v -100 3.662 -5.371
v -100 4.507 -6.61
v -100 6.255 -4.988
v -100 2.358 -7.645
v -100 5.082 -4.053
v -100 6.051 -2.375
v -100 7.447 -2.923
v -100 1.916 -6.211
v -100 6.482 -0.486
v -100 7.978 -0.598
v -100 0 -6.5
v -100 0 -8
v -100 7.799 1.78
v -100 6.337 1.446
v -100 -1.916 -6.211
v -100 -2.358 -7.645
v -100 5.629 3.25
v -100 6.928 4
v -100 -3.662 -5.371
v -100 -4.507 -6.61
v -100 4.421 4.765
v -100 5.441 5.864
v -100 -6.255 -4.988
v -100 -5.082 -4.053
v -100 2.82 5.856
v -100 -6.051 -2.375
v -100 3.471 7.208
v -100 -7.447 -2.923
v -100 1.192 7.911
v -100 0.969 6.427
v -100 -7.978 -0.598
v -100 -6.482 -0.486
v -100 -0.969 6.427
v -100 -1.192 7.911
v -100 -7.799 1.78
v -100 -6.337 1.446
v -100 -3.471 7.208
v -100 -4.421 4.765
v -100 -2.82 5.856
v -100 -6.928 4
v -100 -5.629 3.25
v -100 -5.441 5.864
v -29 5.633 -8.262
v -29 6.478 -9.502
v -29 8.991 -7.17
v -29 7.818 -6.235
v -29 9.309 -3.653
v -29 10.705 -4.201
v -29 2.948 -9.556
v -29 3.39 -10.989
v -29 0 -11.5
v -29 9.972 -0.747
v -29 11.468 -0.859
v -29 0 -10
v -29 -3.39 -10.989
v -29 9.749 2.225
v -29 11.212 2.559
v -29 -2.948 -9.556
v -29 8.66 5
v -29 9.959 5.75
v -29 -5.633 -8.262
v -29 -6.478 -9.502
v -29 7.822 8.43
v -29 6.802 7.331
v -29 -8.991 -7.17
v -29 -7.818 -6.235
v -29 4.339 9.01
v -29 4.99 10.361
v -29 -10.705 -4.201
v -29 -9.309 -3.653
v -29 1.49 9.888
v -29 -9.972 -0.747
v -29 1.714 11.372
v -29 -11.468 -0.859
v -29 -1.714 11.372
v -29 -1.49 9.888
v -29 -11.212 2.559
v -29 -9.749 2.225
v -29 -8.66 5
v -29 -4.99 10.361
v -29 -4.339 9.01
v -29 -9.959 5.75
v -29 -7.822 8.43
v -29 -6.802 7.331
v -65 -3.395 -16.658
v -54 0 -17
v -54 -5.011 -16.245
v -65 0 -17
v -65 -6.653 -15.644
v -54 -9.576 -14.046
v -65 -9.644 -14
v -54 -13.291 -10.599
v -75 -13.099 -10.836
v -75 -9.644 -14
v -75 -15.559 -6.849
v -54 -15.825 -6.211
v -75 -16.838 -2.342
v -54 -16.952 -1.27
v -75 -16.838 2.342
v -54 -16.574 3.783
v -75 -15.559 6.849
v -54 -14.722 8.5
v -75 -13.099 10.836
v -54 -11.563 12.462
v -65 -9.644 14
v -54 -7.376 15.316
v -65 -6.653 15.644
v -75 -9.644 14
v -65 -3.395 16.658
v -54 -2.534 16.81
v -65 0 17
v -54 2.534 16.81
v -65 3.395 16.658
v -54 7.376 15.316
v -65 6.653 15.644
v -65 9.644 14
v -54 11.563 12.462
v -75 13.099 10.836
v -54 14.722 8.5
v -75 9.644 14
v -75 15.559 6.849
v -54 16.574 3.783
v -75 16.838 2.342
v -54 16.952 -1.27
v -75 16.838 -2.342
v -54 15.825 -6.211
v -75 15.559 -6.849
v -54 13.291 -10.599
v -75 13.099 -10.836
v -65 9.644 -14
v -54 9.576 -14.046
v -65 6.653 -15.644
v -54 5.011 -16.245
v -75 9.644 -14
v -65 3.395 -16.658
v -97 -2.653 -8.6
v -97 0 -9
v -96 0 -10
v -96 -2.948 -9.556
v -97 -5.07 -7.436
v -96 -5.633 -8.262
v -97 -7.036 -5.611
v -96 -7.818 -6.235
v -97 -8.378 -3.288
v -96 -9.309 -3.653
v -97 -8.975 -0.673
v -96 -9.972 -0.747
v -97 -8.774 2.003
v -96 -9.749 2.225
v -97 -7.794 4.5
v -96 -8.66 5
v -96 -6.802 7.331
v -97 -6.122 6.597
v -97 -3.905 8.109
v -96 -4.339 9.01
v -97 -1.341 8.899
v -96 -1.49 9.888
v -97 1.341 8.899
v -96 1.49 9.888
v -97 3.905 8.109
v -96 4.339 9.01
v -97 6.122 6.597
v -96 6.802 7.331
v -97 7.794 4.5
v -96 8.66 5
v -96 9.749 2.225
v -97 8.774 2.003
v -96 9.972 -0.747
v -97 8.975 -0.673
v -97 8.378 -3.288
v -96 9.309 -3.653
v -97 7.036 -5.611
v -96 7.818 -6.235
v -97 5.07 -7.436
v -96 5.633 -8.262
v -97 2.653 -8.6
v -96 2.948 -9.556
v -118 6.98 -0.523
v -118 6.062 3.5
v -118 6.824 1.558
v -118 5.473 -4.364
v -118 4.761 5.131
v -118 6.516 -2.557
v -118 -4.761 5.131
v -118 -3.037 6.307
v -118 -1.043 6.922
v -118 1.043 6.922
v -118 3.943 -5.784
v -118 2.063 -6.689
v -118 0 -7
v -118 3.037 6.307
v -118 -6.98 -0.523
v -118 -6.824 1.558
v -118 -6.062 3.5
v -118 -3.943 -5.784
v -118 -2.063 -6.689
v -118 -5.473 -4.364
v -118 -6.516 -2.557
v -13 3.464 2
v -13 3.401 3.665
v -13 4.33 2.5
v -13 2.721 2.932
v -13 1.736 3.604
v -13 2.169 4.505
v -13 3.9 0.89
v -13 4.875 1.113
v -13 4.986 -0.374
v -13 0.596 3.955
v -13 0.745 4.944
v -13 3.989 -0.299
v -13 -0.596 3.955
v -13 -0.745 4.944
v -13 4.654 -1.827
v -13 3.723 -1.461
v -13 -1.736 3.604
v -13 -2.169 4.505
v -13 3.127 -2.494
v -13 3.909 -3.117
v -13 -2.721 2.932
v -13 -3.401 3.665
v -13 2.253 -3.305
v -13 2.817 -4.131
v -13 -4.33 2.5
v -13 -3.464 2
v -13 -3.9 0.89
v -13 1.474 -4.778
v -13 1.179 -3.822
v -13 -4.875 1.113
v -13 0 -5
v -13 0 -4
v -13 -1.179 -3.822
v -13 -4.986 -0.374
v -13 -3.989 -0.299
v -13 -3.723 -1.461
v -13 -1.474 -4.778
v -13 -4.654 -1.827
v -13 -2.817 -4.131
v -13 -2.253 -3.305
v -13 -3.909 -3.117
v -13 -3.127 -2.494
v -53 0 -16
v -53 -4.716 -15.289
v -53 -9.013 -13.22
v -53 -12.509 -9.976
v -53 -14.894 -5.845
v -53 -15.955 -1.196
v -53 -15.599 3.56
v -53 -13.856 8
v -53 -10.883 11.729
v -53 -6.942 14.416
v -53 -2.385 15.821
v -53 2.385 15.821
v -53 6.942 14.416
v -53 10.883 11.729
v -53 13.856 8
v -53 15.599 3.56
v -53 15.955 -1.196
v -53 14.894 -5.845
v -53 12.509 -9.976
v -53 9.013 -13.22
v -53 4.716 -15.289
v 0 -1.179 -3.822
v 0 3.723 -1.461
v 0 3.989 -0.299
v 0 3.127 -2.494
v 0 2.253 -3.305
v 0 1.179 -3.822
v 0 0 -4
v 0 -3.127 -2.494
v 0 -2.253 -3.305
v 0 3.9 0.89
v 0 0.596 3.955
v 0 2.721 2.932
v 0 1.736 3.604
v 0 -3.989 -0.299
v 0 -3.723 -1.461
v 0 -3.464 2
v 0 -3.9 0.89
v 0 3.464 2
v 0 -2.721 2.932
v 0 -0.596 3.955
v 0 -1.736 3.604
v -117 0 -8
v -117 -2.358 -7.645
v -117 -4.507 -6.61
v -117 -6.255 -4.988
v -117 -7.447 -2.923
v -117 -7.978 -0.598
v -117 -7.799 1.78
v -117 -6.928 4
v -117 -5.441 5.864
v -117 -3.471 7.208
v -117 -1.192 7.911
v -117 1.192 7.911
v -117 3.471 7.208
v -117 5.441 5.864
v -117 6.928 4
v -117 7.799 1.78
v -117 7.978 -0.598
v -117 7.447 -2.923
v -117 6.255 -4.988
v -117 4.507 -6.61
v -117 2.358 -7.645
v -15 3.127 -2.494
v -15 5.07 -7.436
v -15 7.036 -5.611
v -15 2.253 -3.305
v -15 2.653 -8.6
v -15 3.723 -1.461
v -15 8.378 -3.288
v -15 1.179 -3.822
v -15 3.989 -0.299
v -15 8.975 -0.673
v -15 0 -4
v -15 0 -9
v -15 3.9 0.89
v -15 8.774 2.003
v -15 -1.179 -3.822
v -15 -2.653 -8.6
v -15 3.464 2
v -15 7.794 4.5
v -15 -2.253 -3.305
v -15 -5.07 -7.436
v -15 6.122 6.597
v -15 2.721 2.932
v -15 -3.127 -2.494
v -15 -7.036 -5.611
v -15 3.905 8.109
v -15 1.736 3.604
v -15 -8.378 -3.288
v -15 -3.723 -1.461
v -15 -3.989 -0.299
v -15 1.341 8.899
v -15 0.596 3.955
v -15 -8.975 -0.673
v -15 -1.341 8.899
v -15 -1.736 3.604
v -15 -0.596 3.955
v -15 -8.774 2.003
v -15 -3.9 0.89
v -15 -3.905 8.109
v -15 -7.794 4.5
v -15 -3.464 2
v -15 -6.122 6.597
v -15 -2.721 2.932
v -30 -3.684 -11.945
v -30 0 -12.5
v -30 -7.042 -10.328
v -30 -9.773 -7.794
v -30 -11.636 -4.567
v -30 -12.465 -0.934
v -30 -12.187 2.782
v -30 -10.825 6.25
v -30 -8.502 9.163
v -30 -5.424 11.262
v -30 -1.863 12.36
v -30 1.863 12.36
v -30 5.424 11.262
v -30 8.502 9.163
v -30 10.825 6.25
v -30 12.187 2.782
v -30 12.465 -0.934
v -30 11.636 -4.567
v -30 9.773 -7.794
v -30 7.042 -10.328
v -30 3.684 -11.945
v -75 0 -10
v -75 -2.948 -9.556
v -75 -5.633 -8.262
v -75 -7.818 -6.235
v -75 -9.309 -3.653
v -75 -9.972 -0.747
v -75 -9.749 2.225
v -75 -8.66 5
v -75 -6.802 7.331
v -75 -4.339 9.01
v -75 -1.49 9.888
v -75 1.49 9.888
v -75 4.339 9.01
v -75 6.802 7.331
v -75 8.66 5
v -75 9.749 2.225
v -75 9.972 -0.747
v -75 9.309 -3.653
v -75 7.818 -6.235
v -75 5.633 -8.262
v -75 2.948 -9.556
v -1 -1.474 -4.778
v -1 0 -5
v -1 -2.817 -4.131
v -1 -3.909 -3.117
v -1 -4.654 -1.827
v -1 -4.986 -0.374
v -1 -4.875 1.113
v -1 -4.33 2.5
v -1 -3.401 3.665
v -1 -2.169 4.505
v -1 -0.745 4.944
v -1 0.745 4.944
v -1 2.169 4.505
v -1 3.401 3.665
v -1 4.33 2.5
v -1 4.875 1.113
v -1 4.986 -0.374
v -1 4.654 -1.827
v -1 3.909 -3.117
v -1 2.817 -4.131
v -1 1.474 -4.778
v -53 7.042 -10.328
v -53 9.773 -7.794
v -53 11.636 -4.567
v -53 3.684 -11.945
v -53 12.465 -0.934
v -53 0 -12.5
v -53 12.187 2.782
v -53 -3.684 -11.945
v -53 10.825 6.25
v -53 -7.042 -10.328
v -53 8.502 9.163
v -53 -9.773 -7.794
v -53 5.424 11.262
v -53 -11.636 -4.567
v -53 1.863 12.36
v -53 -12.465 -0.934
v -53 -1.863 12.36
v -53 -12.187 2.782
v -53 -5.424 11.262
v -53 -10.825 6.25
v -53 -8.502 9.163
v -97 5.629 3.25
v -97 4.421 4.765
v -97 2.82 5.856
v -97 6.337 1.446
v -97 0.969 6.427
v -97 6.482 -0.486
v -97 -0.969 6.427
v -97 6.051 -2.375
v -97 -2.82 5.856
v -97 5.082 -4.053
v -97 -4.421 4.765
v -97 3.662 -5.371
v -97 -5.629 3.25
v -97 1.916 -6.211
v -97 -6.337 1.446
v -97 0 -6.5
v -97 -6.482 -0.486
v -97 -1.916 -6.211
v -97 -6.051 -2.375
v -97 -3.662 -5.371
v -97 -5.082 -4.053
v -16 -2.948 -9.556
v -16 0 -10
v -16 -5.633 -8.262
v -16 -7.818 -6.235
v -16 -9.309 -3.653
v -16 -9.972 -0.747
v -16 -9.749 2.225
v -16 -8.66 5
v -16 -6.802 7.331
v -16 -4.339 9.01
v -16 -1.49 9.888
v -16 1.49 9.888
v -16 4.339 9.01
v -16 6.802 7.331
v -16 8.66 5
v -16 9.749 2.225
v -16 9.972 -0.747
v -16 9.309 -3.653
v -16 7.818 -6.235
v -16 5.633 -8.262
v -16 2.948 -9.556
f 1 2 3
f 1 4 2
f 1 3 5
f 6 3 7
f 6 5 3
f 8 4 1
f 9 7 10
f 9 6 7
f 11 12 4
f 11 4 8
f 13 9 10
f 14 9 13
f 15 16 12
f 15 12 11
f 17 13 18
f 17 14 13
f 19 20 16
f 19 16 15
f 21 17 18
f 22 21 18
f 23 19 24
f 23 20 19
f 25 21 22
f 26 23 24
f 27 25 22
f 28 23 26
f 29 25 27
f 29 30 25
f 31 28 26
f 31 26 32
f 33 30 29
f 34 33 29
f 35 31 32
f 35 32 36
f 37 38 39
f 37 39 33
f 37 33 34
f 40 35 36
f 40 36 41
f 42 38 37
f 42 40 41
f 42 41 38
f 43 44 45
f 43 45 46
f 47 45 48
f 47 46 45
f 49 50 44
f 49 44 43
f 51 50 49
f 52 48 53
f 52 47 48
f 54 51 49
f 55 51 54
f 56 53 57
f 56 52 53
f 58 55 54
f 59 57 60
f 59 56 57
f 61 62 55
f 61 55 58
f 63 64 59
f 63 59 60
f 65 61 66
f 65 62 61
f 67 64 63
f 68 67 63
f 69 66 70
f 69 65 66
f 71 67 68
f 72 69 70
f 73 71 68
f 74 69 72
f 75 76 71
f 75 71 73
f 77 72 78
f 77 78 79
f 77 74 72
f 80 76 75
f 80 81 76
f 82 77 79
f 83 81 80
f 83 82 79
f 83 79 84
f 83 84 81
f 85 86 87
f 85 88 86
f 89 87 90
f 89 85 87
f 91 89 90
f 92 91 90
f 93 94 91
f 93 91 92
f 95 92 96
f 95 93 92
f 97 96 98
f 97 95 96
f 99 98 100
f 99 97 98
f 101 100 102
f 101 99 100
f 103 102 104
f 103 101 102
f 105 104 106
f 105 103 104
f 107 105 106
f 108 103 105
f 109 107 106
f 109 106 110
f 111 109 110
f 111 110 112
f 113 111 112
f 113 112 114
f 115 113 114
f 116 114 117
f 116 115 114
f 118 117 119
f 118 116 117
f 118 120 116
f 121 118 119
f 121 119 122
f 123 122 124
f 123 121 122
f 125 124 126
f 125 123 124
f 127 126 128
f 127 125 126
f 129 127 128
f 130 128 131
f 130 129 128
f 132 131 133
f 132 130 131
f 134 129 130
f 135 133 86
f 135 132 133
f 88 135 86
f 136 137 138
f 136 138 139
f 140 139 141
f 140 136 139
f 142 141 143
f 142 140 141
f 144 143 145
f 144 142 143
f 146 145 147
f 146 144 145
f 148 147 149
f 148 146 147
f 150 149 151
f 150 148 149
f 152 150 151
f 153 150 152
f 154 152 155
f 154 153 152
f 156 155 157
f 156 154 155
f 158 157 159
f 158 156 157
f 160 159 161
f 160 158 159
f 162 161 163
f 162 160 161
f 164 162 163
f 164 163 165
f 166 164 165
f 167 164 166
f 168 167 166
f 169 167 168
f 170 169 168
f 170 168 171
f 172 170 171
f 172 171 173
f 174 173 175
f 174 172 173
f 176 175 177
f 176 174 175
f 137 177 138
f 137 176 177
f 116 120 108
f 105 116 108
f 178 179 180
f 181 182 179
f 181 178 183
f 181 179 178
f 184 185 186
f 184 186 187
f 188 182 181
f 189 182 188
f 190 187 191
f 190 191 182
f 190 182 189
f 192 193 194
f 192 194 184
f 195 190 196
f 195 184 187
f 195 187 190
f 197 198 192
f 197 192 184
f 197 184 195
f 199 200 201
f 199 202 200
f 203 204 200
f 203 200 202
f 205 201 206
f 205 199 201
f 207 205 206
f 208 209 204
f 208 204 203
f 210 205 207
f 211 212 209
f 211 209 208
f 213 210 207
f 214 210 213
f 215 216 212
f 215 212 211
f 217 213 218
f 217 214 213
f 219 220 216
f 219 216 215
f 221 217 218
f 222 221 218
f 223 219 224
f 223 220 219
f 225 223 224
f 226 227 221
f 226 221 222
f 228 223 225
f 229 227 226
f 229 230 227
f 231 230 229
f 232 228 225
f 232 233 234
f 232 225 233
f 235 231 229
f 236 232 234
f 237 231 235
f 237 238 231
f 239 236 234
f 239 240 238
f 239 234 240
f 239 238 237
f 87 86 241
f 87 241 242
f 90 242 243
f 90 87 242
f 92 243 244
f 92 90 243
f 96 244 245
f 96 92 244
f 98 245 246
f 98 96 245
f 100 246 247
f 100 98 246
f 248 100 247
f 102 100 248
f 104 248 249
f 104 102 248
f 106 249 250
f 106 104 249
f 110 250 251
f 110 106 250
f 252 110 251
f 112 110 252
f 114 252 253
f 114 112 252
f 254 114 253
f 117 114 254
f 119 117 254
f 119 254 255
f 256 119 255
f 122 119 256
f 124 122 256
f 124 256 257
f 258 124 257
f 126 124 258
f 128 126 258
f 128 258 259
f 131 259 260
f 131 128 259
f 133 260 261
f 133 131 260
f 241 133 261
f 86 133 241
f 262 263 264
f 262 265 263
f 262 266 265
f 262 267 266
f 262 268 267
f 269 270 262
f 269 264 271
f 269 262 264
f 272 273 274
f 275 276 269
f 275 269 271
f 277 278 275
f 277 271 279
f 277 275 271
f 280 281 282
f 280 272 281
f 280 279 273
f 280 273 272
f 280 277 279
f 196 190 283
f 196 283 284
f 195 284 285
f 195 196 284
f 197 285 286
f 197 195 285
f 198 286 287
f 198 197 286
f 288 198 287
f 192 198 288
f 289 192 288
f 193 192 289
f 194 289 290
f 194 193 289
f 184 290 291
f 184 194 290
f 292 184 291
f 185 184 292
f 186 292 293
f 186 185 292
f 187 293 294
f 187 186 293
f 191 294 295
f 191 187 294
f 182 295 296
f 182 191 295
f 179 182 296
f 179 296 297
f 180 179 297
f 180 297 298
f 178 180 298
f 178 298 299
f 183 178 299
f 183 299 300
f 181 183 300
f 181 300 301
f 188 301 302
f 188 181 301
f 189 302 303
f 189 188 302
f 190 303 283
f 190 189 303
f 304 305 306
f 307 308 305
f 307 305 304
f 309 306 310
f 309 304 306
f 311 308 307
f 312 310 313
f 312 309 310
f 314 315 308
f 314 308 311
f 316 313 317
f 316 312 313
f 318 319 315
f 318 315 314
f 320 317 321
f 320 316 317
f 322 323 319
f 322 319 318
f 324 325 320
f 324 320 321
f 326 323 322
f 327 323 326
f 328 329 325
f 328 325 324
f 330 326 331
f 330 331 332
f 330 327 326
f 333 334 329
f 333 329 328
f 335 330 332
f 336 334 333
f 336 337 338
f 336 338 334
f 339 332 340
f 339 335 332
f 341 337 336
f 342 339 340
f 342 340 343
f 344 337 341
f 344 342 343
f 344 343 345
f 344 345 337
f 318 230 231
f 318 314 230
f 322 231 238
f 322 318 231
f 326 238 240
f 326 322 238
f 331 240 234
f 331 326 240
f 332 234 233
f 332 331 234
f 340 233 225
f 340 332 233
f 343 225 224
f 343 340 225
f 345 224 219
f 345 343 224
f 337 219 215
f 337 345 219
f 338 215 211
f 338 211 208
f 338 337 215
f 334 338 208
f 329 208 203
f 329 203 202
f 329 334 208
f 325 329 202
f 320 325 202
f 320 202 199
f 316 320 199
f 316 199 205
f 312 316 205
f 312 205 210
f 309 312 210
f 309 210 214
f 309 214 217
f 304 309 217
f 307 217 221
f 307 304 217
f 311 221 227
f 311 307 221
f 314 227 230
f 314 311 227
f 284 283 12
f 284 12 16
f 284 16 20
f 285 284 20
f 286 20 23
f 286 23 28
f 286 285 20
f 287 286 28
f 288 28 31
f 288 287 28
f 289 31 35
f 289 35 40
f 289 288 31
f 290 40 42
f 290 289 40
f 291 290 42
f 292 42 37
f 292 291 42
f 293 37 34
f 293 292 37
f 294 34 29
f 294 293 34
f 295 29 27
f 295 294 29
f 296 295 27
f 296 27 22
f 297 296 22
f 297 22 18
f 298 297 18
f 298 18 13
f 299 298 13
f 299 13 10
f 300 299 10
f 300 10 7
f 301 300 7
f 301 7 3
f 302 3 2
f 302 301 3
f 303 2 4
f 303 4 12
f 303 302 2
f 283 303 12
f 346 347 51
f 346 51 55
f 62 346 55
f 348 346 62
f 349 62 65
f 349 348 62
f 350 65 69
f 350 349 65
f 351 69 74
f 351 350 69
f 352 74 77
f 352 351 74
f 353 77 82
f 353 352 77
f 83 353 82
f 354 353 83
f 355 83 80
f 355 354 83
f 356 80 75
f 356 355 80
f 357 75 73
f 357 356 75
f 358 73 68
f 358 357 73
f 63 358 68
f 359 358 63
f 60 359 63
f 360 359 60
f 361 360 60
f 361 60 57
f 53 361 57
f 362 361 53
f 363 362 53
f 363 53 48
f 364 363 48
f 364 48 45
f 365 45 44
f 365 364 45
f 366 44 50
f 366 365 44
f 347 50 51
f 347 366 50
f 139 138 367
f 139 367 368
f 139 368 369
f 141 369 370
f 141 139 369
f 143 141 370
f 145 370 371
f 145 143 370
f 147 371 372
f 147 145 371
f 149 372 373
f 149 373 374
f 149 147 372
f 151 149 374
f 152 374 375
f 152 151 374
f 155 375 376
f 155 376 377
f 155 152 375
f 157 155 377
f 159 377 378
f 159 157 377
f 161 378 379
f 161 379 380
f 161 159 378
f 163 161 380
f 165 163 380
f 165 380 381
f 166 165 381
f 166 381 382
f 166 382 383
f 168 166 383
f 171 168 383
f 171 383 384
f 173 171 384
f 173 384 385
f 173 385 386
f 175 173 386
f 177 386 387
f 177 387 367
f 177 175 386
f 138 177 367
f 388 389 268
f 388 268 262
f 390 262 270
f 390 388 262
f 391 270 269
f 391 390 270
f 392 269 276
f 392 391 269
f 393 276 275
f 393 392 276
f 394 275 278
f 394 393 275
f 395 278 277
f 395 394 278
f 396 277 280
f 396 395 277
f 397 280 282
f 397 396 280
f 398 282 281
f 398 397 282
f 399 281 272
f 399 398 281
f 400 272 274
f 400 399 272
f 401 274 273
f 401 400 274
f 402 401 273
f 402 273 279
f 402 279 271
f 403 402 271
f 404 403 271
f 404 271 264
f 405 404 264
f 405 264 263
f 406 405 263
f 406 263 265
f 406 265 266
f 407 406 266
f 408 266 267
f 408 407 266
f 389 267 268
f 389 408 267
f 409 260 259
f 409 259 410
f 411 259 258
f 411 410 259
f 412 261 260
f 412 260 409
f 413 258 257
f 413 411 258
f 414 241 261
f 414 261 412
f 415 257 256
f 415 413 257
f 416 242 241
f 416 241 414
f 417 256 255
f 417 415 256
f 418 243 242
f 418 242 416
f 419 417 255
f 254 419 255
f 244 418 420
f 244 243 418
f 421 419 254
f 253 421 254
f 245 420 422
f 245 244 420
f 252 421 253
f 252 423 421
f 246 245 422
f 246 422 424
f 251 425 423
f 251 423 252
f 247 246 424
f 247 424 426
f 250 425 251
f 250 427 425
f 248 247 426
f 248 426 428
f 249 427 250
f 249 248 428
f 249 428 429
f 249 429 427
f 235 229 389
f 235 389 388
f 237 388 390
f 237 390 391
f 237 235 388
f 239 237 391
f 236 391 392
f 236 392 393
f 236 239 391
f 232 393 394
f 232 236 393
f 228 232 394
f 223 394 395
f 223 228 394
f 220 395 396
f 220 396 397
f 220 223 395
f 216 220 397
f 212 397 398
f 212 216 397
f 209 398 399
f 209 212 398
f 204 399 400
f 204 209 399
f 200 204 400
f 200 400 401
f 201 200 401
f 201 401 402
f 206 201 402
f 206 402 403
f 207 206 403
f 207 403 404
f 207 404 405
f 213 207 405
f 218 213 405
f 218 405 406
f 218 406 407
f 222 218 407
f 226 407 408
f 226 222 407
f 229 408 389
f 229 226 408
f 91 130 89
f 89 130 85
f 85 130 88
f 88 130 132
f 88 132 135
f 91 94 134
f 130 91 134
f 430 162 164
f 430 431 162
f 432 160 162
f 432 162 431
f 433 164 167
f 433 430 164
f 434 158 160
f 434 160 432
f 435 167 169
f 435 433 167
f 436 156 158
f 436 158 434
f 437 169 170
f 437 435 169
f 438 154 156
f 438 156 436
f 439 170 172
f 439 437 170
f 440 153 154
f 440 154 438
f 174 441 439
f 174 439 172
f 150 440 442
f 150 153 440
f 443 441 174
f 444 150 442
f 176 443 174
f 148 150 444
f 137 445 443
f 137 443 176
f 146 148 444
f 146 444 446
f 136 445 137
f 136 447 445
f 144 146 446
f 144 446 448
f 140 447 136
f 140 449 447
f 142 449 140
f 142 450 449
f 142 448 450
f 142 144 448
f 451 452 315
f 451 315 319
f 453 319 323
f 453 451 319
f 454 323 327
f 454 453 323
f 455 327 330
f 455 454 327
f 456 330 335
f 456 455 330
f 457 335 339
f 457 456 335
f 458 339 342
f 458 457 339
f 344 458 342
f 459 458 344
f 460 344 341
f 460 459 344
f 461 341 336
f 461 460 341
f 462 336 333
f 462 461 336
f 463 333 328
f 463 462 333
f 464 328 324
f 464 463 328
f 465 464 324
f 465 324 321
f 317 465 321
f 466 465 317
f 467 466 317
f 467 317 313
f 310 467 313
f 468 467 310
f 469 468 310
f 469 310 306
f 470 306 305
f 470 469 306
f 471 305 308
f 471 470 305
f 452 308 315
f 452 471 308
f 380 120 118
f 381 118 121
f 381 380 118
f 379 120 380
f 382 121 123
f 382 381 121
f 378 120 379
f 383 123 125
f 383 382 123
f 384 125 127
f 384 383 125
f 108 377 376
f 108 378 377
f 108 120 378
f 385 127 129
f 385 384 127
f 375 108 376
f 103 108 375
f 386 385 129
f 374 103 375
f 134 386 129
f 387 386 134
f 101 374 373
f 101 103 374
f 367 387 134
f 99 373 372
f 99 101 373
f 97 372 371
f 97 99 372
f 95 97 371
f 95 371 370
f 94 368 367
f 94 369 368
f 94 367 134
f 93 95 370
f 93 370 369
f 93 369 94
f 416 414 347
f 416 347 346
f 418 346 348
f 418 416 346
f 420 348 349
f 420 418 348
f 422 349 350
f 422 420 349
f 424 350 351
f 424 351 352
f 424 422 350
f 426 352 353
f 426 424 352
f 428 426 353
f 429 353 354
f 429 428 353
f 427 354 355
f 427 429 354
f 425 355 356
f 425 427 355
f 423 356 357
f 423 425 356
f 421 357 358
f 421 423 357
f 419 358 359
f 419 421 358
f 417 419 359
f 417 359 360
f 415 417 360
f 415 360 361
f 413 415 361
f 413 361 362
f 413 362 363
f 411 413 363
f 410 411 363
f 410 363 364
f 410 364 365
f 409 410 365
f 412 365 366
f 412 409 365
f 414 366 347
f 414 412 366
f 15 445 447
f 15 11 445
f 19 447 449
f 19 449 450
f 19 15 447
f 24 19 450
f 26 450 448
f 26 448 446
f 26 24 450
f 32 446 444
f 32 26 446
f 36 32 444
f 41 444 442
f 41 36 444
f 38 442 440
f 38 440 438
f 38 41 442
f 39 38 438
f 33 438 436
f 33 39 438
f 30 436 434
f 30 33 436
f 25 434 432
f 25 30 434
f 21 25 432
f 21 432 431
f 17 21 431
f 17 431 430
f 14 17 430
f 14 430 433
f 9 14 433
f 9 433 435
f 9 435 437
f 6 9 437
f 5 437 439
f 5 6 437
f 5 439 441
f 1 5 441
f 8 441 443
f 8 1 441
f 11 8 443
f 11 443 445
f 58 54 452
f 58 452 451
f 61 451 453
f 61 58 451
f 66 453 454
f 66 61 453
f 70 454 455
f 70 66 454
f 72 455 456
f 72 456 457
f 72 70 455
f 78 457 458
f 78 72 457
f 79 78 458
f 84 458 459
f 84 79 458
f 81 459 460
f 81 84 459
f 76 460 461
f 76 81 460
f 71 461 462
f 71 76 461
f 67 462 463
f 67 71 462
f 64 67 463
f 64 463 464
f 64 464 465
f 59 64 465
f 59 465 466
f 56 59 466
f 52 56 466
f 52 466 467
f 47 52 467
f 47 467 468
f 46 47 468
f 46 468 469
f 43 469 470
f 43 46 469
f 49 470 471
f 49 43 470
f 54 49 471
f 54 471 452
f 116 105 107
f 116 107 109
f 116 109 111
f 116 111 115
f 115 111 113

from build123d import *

# Parameters (mm, degrees)
CHAMFER1_SIZE      = 1
CUT_EXTRUDE1_DEPTH = 10


with BuildPart() as part:
    # Sketch1 → Revolve1 (revolve)
    with BuildSketch(Plane.XY, mode=Mode.PRIVATE) as revolve1_sk:
        Polygon((0, 0), (0, 5), (-13, 5), (-13, 4), (-15, 4), (-15, 10), (-29, 10), (-29, 12.5), (-53, 12.5), (-53, 17), (-75, 17), (-75, 10), (-97, 10), (-97, 6.5), (-100, 6.5), (-100, 8), (-118, 8), (-118, 0), align=None)
    revolve(revolve1_sk.sketch.rotate(Axis((0, 0, 0), (-1, 0, 0)), 90), axis=Axis((0, 0, 0), (-1, 0, 0)))

    # Chamfer1
    chamfer1_edges = [part.edges().sort_by_distance(p)[0] for p in [
        (-118, 0, 8),
        (-97, 0, 10),
        (-53, 0, 17),
        (-29, 0, 12.5),
        (-15, 0, 10),
        (0, 0, 5),
    ]]
    chamfer(chamfer1_edges, length=CHAMFER1_SIZE)

    # Sketch2 → Cut-Extrude1 (cut)
    with BuildSketch(Plane.ZY.offset(75)):
        with BuildLine():
            Line((-14, -9.643650761), (-14, 9.643650761))
            ThreePointArc((-14, 9.643650761), (-17, 0), (-14, -9.643650761))
        make_face()
        with BuildLine():
            ThreePointArc((17, 0), (16.232683081, 5.049752469), (14, 9.643650761))
            Line((14, 9.643650761), (14, -9.643650761))
            ThreePointArc((14, -9.643650761), (16.232683081, -5.049752469), (17, 0))
        make_face()
    extrude(amount=-CUT_EXTRUDE1_DEPTH, mode=Mode.SUBTRACT)


solid = part.part
